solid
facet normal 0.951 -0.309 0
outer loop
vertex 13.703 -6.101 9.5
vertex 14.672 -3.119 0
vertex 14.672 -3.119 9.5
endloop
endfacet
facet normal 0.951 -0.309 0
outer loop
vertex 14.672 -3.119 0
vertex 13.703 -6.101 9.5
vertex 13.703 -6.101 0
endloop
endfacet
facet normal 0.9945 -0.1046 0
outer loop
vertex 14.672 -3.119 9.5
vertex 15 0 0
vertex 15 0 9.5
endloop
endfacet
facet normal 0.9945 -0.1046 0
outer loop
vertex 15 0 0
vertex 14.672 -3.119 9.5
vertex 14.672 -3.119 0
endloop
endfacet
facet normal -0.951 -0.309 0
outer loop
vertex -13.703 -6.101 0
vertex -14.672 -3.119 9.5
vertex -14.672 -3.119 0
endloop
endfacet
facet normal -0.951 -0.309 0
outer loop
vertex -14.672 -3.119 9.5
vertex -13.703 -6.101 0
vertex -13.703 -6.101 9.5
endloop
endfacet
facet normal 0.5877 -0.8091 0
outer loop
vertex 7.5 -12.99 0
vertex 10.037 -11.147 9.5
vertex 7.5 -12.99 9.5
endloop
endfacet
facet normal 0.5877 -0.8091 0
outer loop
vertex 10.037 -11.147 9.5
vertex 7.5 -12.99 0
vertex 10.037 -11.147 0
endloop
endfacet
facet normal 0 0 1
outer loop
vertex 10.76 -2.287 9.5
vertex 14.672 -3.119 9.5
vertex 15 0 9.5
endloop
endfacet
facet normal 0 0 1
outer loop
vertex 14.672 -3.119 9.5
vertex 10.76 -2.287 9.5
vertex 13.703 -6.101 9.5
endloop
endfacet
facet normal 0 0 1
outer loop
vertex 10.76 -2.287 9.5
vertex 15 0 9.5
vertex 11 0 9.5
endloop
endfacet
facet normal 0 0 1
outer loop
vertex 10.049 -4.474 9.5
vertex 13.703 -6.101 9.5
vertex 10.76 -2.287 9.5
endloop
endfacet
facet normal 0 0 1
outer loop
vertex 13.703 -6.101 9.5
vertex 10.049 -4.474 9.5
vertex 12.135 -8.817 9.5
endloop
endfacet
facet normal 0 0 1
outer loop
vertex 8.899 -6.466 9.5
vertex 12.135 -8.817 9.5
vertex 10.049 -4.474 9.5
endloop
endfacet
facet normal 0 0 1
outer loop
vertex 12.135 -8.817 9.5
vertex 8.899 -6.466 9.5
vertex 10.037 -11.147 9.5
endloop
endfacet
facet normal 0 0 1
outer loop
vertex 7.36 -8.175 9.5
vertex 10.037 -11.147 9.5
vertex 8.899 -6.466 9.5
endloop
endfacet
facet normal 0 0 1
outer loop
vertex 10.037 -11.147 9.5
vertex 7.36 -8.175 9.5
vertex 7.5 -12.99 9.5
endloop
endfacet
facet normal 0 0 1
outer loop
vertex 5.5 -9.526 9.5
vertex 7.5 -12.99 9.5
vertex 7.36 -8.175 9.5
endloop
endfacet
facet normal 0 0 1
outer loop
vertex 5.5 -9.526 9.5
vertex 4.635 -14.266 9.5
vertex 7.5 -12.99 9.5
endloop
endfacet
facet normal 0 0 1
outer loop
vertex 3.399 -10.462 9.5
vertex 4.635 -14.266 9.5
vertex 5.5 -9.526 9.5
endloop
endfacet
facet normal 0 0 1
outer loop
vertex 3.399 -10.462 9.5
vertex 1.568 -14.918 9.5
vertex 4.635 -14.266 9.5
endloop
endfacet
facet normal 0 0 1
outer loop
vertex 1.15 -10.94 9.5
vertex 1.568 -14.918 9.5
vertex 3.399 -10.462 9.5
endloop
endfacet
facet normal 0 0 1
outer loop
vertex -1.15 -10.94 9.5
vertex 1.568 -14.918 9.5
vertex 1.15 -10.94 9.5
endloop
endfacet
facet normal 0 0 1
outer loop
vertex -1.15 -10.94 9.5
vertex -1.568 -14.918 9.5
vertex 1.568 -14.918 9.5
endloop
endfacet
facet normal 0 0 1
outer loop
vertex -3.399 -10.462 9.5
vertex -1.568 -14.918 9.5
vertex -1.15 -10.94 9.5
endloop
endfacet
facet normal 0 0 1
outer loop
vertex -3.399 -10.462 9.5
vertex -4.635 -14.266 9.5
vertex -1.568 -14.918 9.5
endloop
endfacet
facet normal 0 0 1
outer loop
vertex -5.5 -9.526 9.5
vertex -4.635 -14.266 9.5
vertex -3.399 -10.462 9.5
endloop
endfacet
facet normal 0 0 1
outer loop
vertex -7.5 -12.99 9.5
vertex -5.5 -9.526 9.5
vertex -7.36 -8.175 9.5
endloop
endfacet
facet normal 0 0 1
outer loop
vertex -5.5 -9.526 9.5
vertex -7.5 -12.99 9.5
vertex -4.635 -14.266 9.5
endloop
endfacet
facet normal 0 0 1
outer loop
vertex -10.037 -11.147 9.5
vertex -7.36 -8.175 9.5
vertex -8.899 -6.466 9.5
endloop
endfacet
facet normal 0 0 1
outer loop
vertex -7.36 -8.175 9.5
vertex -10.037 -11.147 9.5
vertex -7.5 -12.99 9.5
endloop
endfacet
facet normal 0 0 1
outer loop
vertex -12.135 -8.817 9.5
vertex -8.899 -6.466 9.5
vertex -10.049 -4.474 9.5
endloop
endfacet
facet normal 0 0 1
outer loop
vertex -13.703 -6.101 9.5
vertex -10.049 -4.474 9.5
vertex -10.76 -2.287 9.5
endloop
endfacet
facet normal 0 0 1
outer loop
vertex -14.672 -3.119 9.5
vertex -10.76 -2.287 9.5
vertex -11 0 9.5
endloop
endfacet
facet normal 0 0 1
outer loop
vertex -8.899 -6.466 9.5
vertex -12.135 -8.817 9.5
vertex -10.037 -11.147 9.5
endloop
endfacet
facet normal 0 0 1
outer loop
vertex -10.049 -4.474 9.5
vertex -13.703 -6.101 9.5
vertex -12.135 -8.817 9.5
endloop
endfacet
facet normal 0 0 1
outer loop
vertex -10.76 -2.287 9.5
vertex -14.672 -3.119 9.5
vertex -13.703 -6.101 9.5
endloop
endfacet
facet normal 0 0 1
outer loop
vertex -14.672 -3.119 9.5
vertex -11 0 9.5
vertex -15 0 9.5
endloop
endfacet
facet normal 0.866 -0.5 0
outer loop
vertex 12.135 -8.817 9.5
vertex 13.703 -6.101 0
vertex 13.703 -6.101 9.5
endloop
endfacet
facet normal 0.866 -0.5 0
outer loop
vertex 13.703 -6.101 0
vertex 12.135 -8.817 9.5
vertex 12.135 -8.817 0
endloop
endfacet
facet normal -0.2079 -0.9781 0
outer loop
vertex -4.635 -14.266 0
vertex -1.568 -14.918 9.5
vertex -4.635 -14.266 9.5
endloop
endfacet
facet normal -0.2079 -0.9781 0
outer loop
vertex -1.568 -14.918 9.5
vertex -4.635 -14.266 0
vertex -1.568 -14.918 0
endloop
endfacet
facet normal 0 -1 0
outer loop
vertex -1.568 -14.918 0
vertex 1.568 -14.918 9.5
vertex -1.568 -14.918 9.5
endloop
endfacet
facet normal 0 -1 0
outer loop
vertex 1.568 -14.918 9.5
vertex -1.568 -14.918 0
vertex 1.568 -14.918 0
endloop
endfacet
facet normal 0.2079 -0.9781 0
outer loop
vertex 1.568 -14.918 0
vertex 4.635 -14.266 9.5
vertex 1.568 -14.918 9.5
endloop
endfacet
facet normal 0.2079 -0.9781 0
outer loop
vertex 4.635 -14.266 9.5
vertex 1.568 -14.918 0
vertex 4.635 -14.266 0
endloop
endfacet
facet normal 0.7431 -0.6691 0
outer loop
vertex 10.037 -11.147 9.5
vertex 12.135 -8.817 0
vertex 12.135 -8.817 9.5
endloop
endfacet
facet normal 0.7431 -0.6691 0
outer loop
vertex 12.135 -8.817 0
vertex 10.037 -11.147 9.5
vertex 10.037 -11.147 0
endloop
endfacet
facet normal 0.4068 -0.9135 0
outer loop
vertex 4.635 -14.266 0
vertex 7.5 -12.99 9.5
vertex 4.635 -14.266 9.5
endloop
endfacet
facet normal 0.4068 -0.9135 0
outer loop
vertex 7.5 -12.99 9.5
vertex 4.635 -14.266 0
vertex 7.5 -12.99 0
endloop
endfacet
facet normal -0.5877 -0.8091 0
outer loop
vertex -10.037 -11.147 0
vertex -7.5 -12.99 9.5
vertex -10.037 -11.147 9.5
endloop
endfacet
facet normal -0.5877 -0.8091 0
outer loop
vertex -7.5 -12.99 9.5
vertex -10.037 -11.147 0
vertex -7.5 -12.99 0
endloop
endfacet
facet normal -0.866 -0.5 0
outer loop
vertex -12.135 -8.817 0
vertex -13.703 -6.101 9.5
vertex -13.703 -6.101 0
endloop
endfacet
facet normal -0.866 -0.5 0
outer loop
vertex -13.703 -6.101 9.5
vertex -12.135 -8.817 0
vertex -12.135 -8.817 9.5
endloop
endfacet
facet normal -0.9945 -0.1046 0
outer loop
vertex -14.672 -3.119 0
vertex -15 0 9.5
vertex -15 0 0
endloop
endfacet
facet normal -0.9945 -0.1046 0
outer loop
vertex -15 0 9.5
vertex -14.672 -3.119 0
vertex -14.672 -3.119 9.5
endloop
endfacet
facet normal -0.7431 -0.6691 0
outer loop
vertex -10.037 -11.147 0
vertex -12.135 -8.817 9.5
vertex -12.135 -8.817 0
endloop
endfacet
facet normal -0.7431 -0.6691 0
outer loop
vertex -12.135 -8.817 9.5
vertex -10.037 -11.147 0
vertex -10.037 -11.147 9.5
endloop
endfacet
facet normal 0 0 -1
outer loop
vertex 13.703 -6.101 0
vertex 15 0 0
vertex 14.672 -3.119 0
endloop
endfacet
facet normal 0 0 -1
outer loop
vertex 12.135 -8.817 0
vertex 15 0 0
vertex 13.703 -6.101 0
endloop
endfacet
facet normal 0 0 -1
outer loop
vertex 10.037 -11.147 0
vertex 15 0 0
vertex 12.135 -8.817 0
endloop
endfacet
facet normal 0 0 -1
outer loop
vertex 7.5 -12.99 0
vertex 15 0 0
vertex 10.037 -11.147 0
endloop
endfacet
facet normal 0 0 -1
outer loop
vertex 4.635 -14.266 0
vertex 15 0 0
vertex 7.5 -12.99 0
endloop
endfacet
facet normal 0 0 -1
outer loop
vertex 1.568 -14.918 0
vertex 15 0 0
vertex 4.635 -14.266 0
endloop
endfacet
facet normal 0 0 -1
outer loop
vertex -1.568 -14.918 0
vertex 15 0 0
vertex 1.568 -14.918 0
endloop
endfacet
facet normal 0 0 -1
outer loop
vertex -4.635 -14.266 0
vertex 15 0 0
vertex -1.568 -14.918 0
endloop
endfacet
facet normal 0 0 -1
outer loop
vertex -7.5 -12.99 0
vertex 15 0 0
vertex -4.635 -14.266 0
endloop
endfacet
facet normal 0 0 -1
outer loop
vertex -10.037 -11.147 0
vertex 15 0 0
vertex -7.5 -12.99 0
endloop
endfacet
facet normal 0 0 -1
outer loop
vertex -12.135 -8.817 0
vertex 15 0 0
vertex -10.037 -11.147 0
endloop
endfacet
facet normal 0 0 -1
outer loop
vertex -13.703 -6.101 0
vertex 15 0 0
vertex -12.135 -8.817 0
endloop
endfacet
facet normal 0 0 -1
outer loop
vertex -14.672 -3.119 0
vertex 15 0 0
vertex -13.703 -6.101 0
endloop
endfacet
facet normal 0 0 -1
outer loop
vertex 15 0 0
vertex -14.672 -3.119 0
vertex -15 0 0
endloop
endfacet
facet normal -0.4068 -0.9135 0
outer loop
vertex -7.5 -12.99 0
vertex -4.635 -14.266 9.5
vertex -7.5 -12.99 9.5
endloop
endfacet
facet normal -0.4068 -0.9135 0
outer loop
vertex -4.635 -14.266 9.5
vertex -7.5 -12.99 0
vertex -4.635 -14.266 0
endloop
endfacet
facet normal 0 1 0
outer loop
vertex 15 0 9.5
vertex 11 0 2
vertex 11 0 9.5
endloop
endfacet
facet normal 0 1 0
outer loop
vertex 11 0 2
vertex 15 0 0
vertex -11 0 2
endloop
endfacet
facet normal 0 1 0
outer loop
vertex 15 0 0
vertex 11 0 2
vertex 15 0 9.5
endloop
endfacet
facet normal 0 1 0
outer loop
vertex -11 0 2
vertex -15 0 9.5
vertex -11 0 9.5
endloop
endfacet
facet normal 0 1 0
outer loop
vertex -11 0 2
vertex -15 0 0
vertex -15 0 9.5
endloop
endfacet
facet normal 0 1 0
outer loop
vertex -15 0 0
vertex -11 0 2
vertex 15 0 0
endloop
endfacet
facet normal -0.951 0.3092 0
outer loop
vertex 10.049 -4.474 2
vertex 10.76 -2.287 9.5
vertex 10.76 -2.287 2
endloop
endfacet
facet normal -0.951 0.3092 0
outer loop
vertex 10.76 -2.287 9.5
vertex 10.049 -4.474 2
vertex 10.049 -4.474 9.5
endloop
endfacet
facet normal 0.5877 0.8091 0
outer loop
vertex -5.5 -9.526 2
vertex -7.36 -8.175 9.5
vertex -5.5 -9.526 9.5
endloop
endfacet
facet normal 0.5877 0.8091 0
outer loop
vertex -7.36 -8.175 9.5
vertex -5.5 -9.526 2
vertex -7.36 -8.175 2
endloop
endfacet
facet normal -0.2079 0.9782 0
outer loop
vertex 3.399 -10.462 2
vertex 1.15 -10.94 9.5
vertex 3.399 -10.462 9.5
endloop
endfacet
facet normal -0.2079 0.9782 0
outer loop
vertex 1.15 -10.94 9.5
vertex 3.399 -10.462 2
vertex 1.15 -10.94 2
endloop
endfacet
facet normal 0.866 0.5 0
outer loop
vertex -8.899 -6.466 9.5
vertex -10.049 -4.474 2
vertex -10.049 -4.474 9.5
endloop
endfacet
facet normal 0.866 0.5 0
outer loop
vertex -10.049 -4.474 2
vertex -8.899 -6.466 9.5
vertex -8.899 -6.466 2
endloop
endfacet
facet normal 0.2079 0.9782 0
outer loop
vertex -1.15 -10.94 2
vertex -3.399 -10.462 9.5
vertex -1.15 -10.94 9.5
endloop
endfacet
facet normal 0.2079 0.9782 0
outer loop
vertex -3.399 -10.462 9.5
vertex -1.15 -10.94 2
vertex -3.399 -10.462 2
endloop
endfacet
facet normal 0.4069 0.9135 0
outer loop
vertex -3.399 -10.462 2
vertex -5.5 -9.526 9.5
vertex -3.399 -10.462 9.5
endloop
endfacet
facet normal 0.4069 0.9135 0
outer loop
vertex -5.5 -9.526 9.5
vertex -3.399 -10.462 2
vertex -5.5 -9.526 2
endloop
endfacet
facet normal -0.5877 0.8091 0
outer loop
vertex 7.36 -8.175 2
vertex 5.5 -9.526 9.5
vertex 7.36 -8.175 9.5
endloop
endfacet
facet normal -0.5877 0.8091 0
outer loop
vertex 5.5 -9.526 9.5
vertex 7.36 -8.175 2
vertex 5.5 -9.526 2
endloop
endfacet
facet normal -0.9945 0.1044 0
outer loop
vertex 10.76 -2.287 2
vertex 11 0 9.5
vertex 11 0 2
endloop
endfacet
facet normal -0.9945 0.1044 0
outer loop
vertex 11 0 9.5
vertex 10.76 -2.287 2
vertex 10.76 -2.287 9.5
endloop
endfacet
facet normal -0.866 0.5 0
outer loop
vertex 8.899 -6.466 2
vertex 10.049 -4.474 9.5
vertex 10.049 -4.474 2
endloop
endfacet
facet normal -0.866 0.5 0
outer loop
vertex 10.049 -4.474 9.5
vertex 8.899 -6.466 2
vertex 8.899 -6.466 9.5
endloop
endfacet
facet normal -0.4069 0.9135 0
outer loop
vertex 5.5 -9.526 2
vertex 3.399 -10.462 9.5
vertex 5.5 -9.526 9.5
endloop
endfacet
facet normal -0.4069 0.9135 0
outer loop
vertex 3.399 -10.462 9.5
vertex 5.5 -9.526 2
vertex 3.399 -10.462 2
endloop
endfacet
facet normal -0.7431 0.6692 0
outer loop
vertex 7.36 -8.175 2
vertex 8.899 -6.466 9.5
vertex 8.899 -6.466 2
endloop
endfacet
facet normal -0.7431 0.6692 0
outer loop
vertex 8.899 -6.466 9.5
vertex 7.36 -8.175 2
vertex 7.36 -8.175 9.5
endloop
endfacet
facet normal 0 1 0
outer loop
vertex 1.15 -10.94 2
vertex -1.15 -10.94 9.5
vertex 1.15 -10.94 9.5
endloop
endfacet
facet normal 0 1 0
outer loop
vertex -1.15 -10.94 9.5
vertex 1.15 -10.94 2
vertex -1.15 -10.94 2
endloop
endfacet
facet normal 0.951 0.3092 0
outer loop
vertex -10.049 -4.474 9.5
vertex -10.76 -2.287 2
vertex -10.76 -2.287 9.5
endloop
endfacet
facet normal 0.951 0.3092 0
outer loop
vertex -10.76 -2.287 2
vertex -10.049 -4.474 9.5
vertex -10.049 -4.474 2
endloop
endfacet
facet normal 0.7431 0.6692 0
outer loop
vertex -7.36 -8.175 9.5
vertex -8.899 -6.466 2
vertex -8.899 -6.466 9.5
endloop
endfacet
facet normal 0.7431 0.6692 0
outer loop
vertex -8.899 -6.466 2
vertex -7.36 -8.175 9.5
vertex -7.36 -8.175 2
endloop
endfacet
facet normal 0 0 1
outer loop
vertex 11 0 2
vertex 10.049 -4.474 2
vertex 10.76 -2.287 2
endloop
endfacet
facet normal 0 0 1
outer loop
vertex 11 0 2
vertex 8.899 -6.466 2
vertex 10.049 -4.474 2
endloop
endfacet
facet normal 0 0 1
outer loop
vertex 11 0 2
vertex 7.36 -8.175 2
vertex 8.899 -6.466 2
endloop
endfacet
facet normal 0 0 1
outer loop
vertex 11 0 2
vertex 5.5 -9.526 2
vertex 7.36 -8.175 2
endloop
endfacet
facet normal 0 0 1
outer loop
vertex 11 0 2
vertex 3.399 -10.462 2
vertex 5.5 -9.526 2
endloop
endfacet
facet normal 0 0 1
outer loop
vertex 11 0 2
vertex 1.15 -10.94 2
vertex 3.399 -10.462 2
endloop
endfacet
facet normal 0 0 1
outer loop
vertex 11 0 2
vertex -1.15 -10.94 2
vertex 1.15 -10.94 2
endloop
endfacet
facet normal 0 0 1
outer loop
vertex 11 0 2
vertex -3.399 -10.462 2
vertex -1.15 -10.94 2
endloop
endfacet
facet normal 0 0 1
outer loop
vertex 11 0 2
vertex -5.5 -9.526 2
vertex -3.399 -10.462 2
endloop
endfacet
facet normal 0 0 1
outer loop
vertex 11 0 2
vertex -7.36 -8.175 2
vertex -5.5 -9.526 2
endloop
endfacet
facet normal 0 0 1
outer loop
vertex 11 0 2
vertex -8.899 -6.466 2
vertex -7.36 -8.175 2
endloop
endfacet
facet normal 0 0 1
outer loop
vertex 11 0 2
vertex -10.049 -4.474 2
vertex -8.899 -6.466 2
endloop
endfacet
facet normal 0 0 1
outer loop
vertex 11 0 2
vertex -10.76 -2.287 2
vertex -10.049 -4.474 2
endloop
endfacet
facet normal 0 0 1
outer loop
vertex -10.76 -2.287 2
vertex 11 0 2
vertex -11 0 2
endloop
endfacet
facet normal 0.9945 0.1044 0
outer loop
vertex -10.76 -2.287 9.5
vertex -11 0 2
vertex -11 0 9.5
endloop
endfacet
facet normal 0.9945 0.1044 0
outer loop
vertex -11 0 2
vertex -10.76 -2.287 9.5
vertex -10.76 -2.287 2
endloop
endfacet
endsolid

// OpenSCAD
radius = 22 /2;
thickness = 1.5;

numbers = 5;
outsite = 30 / 2;
shell = 2;

height = thickness * numbers;

difference(){
    cylinder(h = height+shell, r = outsite, center = false);
    translate([0, outsite/2, (height+shell)/2]){
        cube([outsite*2, outsite, (height+shell)*2], center = true);
    }
    translate([0, 0, shell]){
        cylinder(h = height+shell, r = radius, center = false);
    }
}
